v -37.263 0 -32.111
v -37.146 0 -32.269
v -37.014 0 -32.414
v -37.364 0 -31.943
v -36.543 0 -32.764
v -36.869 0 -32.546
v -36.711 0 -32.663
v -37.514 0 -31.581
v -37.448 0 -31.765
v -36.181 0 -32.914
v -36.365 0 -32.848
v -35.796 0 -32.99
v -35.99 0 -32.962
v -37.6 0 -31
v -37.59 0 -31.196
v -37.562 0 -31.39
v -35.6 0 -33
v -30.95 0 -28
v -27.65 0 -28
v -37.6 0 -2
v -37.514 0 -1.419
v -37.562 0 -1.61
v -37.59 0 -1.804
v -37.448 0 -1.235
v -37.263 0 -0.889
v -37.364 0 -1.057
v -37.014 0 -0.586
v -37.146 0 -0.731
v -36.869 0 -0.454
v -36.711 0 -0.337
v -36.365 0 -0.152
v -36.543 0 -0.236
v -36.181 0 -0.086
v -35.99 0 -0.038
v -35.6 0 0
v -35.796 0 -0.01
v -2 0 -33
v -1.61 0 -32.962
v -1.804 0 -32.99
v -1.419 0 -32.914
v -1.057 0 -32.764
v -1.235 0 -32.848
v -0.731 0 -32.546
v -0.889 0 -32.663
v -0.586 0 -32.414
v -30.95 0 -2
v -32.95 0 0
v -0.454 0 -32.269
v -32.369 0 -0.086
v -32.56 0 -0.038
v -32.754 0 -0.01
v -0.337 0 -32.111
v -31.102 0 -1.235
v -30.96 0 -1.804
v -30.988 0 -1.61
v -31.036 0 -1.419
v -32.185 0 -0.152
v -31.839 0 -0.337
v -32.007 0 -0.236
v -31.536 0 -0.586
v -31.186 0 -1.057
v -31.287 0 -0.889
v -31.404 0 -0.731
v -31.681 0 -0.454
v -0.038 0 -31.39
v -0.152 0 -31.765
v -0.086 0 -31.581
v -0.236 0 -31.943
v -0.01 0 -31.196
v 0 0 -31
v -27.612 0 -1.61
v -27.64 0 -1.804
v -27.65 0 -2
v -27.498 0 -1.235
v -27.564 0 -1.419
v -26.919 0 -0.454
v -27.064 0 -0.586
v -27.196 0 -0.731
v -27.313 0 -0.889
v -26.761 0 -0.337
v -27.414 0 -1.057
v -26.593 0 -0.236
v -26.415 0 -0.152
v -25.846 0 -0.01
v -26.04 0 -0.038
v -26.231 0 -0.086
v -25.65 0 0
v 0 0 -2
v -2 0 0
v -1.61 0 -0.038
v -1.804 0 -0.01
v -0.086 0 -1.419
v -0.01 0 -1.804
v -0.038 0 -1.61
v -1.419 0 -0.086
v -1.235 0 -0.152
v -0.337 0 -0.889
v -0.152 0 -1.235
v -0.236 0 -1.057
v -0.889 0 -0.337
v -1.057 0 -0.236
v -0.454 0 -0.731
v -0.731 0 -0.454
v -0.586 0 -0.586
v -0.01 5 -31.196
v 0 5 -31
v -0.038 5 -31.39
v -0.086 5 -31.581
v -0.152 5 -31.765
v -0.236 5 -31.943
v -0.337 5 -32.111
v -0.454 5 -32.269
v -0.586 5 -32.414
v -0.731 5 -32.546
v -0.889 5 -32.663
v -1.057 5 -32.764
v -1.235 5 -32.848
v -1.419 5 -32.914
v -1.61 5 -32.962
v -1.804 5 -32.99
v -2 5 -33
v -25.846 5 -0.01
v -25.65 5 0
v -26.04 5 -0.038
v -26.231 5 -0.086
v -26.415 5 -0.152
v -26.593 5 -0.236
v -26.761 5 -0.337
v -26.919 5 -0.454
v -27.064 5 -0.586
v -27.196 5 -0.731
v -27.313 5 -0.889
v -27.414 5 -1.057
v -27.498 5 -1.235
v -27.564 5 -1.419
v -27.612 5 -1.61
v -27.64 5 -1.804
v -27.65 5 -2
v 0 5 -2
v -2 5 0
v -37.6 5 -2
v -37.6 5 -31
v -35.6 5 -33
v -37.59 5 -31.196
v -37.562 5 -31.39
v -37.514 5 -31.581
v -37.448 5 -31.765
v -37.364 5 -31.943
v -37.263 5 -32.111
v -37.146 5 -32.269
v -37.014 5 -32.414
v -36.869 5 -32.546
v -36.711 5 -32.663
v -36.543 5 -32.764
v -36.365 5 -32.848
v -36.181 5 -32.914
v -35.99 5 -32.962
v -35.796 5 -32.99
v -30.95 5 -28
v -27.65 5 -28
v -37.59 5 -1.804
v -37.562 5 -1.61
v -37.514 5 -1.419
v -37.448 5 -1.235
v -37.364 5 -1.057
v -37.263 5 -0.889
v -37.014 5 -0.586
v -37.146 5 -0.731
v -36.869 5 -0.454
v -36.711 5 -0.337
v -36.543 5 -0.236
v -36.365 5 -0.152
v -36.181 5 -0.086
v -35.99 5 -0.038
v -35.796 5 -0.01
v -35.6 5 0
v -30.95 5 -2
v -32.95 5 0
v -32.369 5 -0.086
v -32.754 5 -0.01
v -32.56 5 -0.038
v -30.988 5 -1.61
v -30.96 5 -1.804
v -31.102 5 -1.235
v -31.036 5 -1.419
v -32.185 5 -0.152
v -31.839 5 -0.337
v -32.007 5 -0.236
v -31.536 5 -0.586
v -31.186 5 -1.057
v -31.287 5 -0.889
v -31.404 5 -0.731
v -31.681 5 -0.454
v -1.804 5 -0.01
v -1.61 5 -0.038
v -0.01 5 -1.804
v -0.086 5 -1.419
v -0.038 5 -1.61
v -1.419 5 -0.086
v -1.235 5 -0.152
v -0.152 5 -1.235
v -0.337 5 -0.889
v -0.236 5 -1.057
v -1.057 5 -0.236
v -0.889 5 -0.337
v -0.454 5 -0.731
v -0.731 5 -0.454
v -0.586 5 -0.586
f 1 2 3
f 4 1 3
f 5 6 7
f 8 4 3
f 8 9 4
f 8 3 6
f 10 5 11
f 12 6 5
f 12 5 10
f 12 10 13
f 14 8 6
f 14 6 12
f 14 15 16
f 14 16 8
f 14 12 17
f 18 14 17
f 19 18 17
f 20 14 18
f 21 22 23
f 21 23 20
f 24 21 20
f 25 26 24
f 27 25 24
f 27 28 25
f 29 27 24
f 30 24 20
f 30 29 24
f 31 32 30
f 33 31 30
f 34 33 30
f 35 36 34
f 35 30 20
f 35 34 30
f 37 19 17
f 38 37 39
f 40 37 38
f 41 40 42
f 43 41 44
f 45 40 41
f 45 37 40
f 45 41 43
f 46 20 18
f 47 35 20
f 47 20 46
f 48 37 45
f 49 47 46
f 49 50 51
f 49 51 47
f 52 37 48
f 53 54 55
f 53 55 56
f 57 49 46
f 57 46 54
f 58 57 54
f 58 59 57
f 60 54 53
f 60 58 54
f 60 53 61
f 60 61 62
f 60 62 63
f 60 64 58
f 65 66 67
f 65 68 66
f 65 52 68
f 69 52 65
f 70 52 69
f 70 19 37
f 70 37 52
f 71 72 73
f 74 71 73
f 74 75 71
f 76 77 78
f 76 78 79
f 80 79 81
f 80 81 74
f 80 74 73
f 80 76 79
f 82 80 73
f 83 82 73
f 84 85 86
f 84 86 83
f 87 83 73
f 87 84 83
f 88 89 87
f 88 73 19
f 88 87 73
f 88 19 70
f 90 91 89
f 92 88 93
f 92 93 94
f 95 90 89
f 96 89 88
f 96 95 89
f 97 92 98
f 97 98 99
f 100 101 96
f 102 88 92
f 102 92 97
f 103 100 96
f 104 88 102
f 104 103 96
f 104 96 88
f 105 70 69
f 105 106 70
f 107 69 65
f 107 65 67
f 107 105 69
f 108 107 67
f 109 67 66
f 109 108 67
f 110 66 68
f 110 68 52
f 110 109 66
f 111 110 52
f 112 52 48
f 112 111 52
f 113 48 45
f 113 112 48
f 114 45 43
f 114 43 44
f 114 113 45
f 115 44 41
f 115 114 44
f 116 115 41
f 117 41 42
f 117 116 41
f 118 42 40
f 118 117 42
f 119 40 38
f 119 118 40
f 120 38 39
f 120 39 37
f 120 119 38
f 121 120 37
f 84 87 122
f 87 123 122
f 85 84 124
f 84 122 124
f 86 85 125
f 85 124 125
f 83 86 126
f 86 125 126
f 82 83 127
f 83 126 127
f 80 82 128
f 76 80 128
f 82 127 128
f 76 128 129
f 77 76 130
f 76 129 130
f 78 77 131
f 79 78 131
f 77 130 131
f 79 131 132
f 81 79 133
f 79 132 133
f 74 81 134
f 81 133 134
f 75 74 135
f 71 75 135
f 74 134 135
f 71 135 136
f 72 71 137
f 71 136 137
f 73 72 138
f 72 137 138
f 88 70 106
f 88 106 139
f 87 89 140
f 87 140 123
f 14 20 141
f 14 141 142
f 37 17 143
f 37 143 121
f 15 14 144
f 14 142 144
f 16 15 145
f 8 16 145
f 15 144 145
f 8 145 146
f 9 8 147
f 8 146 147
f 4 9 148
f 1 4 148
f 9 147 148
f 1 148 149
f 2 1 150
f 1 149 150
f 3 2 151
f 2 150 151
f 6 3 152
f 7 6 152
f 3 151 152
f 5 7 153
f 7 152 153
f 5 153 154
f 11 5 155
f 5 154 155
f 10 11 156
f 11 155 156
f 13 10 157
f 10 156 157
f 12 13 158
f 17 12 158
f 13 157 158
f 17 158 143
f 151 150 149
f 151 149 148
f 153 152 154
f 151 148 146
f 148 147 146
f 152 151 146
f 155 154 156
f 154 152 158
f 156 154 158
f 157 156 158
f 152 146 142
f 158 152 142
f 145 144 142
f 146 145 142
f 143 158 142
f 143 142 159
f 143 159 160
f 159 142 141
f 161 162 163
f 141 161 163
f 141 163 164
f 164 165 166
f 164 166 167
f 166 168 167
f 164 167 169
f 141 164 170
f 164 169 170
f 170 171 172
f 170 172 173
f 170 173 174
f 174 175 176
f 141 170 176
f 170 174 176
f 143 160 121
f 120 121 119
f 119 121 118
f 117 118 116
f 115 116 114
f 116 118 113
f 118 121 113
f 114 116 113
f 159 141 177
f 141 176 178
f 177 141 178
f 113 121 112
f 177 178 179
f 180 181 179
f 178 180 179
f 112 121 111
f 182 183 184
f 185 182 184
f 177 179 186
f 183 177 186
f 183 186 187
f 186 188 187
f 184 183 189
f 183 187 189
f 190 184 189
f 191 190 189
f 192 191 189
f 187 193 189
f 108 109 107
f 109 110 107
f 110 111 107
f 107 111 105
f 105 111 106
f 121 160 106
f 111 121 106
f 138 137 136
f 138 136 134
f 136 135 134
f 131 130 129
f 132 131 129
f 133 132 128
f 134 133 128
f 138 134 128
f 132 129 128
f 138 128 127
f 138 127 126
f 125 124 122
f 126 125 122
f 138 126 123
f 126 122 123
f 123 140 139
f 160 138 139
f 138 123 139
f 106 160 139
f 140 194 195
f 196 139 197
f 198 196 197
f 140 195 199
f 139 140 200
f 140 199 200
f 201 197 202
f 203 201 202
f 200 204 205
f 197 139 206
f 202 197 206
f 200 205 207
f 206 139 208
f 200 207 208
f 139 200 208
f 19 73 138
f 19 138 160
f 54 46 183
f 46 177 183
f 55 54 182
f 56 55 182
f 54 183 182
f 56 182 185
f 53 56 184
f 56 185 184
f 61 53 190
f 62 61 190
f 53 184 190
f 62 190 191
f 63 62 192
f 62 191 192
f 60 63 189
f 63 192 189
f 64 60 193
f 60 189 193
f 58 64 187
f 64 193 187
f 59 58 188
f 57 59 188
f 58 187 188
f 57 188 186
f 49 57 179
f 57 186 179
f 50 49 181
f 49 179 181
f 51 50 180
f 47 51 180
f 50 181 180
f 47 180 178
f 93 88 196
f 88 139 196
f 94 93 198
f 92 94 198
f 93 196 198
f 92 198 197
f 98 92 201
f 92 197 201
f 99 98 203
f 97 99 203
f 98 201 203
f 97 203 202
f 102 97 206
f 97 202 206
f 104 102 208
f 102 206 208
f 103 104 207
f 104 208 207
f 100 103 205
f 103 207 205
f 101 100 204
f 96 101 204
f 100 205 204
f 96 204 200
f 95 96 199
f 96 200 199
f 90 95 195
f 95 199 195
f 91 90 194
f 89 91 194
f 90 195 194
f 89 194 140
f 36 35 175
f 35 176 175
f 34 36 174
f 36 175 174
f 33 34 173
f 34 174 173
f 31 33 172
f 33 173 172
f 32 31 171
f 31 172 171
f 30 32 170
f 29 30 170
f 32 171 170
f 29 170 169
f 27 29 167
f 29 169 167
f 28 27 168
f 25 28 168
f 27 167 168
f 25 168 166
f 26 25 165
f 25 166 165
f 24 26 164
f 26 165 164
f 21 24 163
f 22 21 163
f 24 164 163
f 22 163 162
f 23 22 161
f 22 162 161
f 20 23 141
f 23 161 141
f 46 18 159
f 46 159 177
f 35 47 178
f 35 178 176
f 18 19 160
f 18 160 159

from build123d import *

# Parameters (mm, degrees)
F1_DEPTH = 5
F2_R     = 2


with BuildPart() as f1:
    # F0 (on Front) → F1 (new body)
    with BuildSketch(Plane.XZ):
        Polygon((0, -33), (0, 0), (-27.65, 0), (-27.65, -28), (-30.95, -28), (-30.95, 0), (-37.6, 0), (-37.6, -33), align=None)
    extrude(amount=-F1_DEPTH)

    # F2
    f2_edges = [f1.edges().sort_by_distance(p)[0] for p in [
        (-37.6, 2.5, 0),
        (-30.95, 2.5, 0),
        (-27.65, 2.5, 0),
        (0, 2.5, 0),
        (0, 2.5, -33),
        (-37.6, 2.5, -33),
    ]]
    fillet(f2_edges, radius=F2_R)


solid = f1.part
